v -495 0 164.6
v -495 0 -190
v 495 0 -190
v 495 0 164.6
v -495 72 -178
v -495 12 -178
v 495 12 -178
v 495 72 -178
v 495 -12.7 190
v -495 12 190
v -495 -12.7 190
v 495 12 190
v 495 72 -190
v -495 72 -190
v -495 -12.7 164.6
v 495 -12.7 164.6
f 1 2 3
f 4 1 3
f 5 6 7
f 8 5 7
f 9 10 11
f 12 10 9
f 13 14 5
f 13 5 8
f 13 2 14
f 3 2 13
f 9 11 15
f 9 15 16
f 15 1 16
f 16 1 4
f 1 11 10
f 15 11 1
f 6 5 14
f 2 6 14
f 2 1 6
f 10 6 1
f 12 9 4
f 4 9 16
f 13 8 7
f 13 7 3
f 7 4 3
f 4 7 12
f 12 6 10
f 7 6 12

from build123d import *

# Parameters (mm, degrees)
SKETCH1_W           = 990
SKETCH1_H           = 380
BOSS_EXTRUDE1_DEPTH = 12
SKETCH2_W           = 990
SKETCH2_H           = 25.4
BOSS_EXTRUDE2_DEPTH = 12.7
SKETCH3_W           = 990
SKETCH3_H           = 12
BOSS_EXTRUDE3_DEPTH = 60


with BuildPart() as part:
    # Sketch1 → Boss-Extrude1 (new body)
    with BuildSketch(Plane(origin=(0, 0, 0), x_dir=(1, 0, 0), z_dir=(0, 1, 0))):
        Rectangle(SKETCH1_W, SKETCH1_H)
    extrude(amount=BOSS_EXTRUDE1_DEPTH)

    # Sketch2 → Boss-Extrude2 (add)
    with BuildSketch(Plane.XZ):
        with Locations((0, 177.3)):
            Rectangle(SKETCH2_W, SKETCH2_H)
    extrude(amount=BOSS_EXTRUDE2_DEPTH)

    # Sketch3 → Boss-Extrude3 (add)
    with BuildSketch(Plane(origin=(0, 12, 0), x_dir=(1, 0, 0), z_dir=(0, 1, 0))):
        with Locations((0, 184)):
            Rectangle(SKETCH3_W, SKETCH3_H)
    extrude(amount=BOSS_EXTRUDE3_DEPTH)


solid = part.part
